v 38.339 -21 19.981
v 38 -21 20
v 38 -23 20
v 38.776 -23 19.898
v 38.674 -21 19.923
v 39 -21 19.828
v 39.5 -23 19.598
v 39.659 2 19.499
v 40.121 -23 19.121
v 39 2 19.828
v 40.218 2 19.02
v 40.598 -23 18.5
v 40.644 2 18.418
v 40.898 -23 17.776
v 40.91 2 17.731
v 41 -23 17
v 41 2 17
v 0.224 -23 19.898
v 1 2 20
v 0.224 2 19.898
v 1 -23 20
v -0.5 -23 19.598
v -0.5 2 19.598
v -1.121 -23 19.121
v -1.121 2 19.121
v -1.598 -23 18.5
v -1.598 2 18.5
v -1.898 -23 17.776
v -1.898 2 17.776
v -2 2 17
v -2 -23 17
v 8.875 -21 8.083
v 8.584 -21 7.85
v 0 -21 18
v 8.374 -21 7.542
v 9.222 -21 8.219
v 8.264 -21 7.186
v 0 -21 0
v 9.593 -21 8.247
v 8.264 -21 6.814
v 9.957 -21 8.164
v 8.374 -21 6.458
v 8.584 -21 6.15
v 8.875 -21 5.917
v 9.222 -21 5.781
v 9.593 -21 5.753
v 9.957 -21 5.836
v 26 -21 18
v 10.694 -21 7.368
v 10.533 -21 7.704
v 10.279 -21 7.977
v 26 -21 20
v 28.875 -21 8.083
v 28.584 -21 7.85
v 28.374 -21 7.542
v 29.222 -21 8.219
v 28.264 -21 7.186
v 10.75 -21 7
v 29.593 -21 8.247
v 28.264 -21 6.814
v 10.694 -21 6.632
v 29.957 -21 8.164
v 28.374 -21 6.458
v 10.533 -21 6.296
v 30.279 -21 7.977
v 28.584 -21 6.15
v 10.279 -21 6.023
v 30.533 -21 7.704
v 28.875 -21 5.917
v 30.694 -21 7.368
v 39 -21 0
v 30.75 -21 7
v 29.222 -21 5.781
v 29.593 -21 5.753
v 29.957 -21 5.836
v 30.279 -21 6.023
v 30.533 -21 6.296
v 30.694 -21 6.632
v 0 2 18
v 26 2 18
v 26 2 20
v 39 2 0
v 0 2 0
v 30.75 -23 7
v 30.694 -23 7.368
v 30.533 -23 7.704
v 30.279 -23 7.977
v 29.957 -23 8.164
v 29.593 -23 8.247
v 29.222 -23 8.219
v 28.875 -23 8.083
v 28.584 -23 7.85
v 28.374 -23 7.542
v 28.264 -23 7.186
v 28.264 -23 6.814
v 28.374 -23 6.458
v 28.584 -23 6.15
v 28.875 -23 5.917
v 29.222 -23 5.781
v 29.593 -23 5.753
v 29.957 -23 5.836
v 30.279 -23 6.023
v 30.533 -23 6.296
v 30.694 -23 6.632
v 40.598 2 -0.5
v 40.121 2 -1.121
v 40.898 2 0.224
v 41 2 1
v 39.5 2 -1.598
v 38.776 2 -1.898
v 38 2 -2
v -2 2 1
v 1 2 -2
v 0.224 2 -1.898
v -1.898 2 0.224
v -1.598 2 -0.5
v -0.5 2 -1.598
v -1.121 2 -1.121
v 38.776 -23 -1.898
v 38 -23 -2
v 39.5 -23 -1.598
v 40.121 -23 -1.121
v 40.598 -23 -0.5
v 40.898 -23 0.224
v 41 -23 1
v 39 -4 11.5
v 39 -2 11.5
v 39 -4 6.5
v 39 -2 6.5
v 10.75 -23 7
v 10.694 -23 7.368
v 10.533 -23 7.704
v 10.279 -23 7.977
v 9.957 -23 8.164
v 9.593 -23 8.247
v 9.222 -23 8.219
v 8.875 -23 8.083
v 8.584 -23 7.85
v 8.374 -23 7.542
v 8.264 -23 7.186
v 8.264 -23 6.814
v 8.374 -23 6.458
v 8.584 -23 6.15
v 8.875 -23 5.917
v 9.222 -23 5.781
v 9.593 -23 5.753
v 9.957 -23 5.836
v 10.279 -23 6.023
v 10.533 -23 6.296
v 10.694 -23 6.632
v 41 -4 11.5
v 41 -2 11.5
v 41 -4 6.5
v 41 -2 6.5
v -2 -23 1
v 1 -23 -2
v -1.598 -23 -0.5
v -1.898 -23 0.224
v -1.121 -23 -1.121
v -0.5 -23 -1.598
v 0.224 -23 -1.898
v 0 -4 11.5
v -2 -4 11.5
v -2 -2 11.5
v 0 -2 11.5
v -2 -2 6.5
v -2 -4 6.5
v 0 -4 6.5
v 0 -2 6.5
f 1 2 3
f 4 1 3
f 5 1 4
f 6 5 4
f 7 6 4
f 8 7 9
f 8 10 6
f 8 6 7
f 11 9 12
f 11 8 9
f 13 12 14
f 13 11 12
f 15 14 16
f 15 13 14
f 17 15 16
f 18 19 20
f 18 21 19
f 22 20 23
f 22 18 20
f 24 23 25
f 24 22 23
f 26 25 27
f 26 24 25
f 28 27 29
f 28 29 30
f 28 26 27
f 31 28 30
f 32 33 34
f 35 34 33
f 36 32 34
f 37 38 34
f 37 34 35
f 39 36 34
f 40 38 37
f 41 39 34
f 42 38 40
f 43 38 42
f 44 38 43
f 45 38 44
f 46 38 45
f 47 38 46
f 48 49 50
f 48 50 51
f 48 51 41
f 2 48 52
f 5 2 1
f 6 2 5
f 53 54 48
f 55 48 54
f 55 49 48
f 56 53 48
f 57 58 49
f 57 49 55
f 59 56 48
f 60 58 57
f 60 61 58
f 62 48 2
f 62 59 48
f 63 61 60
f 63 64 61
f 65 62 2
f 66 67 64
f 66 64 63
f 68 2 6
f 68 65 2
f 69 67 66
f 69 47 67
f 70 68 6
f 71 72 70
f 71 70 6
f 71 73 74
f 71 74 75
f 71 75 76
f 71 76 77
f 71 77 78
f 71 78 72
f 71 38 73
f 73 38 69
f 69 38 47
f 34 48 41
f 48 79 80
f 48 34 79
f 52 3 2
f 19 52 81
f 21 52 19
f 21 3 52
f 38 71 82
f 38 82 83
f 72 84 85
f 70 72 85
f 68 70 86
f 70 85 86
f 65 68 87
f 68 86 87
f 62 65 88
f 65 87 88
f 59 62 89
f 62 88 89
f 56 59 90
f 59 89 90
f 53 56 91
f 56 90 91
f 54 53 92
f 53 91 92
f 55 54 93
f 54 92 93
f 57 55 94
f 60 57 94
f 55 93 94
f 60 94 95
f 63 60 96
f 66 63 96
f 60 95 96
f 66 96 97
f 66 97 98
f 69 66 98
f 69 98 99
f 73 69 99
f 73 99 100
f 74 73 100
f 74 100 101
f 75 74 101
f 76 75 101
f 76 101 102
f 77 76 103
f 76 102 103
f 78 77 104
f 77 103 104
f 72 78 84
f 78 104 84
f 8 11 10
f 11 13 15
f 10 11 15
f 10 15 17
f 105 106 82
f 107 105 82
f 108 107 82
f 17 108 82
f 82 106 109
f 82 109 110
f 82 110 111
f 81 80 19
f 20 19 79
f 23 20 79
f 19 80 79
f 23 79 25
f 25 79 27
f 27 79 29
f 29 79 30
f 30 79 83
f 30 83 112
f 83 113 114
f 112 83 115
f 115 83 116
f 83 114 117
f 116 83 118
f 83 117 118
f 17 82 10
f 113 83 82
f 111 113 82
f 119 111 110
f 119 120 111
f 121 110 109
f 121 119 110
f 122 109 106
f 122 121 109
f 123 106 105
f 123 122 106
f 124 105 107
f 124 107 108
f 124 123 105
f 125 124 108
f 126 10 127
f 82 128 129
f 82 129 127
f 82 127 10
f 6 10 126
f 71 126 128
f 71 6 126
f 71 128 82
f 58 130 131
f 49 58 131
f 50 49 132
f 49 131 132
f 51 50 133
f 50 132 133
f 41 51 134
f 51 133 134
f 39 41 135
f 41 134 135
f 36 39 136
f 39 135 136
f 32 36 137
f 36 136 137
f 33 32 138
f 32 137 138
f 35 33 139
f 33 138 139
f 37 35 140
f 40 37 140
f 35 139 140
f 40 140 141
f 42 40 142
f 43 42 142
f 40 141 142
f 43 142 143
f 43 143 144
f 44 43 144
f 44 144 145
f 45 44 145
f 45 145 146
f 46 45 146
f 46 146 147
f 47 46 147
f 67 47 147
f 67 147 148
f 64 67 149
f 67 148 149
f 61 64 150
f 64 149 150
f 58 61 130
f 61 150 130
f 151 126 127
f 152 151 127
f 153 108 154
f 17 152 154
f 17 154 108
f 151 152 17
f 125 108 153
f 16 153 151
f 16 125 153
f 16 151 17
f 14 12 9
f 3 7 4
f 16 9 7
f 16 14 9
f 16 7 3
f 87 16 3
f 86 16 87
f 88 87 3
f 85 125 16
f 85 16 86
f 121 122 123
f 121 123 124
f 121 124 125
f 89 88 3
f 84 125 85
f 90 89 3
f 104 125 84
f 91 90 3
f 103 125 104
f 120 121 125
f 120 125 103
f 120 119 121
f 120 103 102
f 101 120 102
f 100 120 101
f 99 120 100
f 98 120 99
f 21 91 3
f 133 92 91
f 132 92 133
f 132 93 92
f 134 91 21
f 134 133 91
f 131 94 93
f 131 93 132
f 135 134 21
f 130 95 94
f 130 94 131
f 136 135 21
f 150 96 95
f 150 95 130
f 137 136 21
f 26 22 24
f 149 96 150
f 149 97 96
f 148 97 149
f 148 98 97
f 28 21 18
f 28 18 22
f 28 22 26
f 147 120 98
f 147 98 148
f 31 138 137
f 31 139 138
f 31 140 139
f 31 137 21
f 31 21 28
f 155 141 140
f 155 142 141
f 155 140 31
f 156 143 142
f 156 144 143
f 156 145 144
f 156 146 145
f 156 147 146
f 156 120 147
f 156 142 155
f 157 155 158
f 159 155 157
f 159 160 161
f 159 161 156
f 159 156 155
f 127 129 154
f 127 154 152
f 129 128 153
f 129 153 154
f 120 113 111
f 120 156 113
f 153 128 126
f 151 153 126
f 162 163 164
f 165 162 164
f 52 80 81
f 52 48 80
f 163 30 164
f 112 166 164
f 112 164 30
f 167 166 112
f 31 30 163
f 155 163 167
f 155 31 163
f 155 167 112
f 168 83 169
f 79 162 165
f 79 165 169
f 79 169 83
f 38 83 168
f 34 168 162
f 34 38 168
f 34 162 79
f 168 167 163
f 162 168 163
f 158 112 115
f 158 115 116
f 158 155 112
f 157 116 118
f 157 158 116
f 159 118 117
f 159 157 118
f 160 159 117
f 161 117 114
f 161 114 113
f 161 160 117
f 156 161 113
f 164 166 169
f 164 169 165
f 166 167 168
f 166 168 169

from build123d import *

# Parameters (mm, degrees)
SKETCH1_W           = 43
SKETCH1_H           = 25
SKETCH1_W_2         = 39
SKETCH1_H_2         = 21
BOSS_EXTRUDE1_DEPTH = 18
SKETCH2_W           = 43
SKETCH2_H           = 25
BOSS_EXTRUDE2_DEPTH = 2
SKETCH3_W           = 43
SKETCH3_H           = 20
CUT_EXTRUDE1_DEPTH  = 2
SKETCH5_W           = 28
SKETCH5_H           = 23
BOSS_EXTRUDE3_DEPTH = 2
SKETCH7_W           = 5
SKETCH7_H           = 2
CUT_EXTRUDE3_DEPTH  = 57.5
BOSS_EXTRUDE4_DEPTH = 2
BOSS_EXTRUDE5_DEPTH = 2
SKETCH18_R          = 1.25
CUT_EXTRUDE4_DEPTH  = 2
FILLET4_R           = 3
FILLET5_R           = 3


with BuildPart() as part:
    # Sketch1 → Boss-Extrude1 (new body)
    with BuildSketch(Plane.XY):
        with Locations((19.5, -10.5)):
            Rectangle(SKETCH1_W, SKETCH1_H)
        with Locations((19.5, -10.5)):
            Rectangle(SKETCH1_W_2, SKETCH1_H_2, mode=Mode.SUBTRACT)
    extrude(amount=BOSS_EXTRUDE1_DEPTH)

    # Sketch2 → Boss-Extrude2 (add)
    with BuildSketch(Plane(origin=(0, 0, 0), x_dir=(-1, 0, 0), z_dir=(0, 0, -1))):
        with Locations((-19.5, -10.5)):
            Rectangle(SKETCH2_W, SKETCH2_H)
    extrude(amount=BOSS_EXTRUDE2_DEPTH)

    # Sketch3 → Cut-Extrude1 (cut)
    with BuildSketch(Plane(origin=(0, 2, 0), x_dir=(1, 0, 0), z_dir=(0, 1, 0))):
        with Locations((19.5, -8)):
            Rectangle(SKETCH3_W, SKETCH3_H)
    extrude(amount=-CUT_EXTRUDE1_DEPTH, mode=Mode.SUBTRACT)

    # Sketch5 → Boss-Extrude3 (add)
    with BuildSketch(Plane.XY.offset(18)):
        with Locations((12, -11.5)):
            Rectangle(SKETCH5_W, SKETCH5_H)
    extrude(amount=BOSS_EXTRUDE3_DEPTH)

    # Sketch7 → Cut-Extrude3 (cut, symmetric)
    with BuildSketch(Plane.ZY.offset(-39)):
        with Locations((9, -3)):
            Rectangle(SKETCH7_W, SKETCH7_H)
    extrude(amount=CUT_EXTRUDE3_DEPTH, both=True, mode=Mode.SUBTRACT)

    # Sketch9 → Boss-Extrude4 (add)
    with BuildSketch(Plane.XY.offset(18)):
        Polygon((26, -21), (39, -21), (39, 0), (41, 0), (41, -23), (26, -23), align=None)
    extrude(amount=BOSS_EXTRUDE4_DEPTH)

    # Sketch14 → Boss-Extrude5 (add)
    with BuildSketch(Plane(origin=(0, 0, 0), x_dir=(1, 0, 0), z_dir=(0, 1, 0))):
        Polygon((26, -18), (26, -20), (-2, -20), (-2, 2), (41, 2), (41, -20), (39, -20), (39, 0), (0, 0), (0, -18), align=None)
    extrude(amount=BOSS_EXTRUDE5_DEPTH)

    # Sketch18 → Cut-Extrude4 (cut)
    with BuildSketch(Plane.XZ.offset(23)):
        with Locations((29.5, 7)):
            Circle(SKETCH18_R)
        with Locations((9.5, 7)):
            Circle(SKETCH18_R)
    extrude(amount=-CUT_EXTRUDE4_DEPTH, mode=Mode.SUBTRACT)

    # Fillet4
    fillet4_edges = [part.edges().sort_by_distance(p)[0] for p in [
        (-2, -10.5, -2),
        (41, -10.5, -2),
        (-2, -10.5, 20),
    ]]
    fillet(fillet4_edges, radius=FILLET4_R)

    # Fillet5
    fillet5_edges = [part.edges().sort_by_distance(p)[0] for p in [
        (41, -10.5, 20),
    ]]
    fillet(fillet5_edges, radius=FILLET5_R)


solid = part.part
